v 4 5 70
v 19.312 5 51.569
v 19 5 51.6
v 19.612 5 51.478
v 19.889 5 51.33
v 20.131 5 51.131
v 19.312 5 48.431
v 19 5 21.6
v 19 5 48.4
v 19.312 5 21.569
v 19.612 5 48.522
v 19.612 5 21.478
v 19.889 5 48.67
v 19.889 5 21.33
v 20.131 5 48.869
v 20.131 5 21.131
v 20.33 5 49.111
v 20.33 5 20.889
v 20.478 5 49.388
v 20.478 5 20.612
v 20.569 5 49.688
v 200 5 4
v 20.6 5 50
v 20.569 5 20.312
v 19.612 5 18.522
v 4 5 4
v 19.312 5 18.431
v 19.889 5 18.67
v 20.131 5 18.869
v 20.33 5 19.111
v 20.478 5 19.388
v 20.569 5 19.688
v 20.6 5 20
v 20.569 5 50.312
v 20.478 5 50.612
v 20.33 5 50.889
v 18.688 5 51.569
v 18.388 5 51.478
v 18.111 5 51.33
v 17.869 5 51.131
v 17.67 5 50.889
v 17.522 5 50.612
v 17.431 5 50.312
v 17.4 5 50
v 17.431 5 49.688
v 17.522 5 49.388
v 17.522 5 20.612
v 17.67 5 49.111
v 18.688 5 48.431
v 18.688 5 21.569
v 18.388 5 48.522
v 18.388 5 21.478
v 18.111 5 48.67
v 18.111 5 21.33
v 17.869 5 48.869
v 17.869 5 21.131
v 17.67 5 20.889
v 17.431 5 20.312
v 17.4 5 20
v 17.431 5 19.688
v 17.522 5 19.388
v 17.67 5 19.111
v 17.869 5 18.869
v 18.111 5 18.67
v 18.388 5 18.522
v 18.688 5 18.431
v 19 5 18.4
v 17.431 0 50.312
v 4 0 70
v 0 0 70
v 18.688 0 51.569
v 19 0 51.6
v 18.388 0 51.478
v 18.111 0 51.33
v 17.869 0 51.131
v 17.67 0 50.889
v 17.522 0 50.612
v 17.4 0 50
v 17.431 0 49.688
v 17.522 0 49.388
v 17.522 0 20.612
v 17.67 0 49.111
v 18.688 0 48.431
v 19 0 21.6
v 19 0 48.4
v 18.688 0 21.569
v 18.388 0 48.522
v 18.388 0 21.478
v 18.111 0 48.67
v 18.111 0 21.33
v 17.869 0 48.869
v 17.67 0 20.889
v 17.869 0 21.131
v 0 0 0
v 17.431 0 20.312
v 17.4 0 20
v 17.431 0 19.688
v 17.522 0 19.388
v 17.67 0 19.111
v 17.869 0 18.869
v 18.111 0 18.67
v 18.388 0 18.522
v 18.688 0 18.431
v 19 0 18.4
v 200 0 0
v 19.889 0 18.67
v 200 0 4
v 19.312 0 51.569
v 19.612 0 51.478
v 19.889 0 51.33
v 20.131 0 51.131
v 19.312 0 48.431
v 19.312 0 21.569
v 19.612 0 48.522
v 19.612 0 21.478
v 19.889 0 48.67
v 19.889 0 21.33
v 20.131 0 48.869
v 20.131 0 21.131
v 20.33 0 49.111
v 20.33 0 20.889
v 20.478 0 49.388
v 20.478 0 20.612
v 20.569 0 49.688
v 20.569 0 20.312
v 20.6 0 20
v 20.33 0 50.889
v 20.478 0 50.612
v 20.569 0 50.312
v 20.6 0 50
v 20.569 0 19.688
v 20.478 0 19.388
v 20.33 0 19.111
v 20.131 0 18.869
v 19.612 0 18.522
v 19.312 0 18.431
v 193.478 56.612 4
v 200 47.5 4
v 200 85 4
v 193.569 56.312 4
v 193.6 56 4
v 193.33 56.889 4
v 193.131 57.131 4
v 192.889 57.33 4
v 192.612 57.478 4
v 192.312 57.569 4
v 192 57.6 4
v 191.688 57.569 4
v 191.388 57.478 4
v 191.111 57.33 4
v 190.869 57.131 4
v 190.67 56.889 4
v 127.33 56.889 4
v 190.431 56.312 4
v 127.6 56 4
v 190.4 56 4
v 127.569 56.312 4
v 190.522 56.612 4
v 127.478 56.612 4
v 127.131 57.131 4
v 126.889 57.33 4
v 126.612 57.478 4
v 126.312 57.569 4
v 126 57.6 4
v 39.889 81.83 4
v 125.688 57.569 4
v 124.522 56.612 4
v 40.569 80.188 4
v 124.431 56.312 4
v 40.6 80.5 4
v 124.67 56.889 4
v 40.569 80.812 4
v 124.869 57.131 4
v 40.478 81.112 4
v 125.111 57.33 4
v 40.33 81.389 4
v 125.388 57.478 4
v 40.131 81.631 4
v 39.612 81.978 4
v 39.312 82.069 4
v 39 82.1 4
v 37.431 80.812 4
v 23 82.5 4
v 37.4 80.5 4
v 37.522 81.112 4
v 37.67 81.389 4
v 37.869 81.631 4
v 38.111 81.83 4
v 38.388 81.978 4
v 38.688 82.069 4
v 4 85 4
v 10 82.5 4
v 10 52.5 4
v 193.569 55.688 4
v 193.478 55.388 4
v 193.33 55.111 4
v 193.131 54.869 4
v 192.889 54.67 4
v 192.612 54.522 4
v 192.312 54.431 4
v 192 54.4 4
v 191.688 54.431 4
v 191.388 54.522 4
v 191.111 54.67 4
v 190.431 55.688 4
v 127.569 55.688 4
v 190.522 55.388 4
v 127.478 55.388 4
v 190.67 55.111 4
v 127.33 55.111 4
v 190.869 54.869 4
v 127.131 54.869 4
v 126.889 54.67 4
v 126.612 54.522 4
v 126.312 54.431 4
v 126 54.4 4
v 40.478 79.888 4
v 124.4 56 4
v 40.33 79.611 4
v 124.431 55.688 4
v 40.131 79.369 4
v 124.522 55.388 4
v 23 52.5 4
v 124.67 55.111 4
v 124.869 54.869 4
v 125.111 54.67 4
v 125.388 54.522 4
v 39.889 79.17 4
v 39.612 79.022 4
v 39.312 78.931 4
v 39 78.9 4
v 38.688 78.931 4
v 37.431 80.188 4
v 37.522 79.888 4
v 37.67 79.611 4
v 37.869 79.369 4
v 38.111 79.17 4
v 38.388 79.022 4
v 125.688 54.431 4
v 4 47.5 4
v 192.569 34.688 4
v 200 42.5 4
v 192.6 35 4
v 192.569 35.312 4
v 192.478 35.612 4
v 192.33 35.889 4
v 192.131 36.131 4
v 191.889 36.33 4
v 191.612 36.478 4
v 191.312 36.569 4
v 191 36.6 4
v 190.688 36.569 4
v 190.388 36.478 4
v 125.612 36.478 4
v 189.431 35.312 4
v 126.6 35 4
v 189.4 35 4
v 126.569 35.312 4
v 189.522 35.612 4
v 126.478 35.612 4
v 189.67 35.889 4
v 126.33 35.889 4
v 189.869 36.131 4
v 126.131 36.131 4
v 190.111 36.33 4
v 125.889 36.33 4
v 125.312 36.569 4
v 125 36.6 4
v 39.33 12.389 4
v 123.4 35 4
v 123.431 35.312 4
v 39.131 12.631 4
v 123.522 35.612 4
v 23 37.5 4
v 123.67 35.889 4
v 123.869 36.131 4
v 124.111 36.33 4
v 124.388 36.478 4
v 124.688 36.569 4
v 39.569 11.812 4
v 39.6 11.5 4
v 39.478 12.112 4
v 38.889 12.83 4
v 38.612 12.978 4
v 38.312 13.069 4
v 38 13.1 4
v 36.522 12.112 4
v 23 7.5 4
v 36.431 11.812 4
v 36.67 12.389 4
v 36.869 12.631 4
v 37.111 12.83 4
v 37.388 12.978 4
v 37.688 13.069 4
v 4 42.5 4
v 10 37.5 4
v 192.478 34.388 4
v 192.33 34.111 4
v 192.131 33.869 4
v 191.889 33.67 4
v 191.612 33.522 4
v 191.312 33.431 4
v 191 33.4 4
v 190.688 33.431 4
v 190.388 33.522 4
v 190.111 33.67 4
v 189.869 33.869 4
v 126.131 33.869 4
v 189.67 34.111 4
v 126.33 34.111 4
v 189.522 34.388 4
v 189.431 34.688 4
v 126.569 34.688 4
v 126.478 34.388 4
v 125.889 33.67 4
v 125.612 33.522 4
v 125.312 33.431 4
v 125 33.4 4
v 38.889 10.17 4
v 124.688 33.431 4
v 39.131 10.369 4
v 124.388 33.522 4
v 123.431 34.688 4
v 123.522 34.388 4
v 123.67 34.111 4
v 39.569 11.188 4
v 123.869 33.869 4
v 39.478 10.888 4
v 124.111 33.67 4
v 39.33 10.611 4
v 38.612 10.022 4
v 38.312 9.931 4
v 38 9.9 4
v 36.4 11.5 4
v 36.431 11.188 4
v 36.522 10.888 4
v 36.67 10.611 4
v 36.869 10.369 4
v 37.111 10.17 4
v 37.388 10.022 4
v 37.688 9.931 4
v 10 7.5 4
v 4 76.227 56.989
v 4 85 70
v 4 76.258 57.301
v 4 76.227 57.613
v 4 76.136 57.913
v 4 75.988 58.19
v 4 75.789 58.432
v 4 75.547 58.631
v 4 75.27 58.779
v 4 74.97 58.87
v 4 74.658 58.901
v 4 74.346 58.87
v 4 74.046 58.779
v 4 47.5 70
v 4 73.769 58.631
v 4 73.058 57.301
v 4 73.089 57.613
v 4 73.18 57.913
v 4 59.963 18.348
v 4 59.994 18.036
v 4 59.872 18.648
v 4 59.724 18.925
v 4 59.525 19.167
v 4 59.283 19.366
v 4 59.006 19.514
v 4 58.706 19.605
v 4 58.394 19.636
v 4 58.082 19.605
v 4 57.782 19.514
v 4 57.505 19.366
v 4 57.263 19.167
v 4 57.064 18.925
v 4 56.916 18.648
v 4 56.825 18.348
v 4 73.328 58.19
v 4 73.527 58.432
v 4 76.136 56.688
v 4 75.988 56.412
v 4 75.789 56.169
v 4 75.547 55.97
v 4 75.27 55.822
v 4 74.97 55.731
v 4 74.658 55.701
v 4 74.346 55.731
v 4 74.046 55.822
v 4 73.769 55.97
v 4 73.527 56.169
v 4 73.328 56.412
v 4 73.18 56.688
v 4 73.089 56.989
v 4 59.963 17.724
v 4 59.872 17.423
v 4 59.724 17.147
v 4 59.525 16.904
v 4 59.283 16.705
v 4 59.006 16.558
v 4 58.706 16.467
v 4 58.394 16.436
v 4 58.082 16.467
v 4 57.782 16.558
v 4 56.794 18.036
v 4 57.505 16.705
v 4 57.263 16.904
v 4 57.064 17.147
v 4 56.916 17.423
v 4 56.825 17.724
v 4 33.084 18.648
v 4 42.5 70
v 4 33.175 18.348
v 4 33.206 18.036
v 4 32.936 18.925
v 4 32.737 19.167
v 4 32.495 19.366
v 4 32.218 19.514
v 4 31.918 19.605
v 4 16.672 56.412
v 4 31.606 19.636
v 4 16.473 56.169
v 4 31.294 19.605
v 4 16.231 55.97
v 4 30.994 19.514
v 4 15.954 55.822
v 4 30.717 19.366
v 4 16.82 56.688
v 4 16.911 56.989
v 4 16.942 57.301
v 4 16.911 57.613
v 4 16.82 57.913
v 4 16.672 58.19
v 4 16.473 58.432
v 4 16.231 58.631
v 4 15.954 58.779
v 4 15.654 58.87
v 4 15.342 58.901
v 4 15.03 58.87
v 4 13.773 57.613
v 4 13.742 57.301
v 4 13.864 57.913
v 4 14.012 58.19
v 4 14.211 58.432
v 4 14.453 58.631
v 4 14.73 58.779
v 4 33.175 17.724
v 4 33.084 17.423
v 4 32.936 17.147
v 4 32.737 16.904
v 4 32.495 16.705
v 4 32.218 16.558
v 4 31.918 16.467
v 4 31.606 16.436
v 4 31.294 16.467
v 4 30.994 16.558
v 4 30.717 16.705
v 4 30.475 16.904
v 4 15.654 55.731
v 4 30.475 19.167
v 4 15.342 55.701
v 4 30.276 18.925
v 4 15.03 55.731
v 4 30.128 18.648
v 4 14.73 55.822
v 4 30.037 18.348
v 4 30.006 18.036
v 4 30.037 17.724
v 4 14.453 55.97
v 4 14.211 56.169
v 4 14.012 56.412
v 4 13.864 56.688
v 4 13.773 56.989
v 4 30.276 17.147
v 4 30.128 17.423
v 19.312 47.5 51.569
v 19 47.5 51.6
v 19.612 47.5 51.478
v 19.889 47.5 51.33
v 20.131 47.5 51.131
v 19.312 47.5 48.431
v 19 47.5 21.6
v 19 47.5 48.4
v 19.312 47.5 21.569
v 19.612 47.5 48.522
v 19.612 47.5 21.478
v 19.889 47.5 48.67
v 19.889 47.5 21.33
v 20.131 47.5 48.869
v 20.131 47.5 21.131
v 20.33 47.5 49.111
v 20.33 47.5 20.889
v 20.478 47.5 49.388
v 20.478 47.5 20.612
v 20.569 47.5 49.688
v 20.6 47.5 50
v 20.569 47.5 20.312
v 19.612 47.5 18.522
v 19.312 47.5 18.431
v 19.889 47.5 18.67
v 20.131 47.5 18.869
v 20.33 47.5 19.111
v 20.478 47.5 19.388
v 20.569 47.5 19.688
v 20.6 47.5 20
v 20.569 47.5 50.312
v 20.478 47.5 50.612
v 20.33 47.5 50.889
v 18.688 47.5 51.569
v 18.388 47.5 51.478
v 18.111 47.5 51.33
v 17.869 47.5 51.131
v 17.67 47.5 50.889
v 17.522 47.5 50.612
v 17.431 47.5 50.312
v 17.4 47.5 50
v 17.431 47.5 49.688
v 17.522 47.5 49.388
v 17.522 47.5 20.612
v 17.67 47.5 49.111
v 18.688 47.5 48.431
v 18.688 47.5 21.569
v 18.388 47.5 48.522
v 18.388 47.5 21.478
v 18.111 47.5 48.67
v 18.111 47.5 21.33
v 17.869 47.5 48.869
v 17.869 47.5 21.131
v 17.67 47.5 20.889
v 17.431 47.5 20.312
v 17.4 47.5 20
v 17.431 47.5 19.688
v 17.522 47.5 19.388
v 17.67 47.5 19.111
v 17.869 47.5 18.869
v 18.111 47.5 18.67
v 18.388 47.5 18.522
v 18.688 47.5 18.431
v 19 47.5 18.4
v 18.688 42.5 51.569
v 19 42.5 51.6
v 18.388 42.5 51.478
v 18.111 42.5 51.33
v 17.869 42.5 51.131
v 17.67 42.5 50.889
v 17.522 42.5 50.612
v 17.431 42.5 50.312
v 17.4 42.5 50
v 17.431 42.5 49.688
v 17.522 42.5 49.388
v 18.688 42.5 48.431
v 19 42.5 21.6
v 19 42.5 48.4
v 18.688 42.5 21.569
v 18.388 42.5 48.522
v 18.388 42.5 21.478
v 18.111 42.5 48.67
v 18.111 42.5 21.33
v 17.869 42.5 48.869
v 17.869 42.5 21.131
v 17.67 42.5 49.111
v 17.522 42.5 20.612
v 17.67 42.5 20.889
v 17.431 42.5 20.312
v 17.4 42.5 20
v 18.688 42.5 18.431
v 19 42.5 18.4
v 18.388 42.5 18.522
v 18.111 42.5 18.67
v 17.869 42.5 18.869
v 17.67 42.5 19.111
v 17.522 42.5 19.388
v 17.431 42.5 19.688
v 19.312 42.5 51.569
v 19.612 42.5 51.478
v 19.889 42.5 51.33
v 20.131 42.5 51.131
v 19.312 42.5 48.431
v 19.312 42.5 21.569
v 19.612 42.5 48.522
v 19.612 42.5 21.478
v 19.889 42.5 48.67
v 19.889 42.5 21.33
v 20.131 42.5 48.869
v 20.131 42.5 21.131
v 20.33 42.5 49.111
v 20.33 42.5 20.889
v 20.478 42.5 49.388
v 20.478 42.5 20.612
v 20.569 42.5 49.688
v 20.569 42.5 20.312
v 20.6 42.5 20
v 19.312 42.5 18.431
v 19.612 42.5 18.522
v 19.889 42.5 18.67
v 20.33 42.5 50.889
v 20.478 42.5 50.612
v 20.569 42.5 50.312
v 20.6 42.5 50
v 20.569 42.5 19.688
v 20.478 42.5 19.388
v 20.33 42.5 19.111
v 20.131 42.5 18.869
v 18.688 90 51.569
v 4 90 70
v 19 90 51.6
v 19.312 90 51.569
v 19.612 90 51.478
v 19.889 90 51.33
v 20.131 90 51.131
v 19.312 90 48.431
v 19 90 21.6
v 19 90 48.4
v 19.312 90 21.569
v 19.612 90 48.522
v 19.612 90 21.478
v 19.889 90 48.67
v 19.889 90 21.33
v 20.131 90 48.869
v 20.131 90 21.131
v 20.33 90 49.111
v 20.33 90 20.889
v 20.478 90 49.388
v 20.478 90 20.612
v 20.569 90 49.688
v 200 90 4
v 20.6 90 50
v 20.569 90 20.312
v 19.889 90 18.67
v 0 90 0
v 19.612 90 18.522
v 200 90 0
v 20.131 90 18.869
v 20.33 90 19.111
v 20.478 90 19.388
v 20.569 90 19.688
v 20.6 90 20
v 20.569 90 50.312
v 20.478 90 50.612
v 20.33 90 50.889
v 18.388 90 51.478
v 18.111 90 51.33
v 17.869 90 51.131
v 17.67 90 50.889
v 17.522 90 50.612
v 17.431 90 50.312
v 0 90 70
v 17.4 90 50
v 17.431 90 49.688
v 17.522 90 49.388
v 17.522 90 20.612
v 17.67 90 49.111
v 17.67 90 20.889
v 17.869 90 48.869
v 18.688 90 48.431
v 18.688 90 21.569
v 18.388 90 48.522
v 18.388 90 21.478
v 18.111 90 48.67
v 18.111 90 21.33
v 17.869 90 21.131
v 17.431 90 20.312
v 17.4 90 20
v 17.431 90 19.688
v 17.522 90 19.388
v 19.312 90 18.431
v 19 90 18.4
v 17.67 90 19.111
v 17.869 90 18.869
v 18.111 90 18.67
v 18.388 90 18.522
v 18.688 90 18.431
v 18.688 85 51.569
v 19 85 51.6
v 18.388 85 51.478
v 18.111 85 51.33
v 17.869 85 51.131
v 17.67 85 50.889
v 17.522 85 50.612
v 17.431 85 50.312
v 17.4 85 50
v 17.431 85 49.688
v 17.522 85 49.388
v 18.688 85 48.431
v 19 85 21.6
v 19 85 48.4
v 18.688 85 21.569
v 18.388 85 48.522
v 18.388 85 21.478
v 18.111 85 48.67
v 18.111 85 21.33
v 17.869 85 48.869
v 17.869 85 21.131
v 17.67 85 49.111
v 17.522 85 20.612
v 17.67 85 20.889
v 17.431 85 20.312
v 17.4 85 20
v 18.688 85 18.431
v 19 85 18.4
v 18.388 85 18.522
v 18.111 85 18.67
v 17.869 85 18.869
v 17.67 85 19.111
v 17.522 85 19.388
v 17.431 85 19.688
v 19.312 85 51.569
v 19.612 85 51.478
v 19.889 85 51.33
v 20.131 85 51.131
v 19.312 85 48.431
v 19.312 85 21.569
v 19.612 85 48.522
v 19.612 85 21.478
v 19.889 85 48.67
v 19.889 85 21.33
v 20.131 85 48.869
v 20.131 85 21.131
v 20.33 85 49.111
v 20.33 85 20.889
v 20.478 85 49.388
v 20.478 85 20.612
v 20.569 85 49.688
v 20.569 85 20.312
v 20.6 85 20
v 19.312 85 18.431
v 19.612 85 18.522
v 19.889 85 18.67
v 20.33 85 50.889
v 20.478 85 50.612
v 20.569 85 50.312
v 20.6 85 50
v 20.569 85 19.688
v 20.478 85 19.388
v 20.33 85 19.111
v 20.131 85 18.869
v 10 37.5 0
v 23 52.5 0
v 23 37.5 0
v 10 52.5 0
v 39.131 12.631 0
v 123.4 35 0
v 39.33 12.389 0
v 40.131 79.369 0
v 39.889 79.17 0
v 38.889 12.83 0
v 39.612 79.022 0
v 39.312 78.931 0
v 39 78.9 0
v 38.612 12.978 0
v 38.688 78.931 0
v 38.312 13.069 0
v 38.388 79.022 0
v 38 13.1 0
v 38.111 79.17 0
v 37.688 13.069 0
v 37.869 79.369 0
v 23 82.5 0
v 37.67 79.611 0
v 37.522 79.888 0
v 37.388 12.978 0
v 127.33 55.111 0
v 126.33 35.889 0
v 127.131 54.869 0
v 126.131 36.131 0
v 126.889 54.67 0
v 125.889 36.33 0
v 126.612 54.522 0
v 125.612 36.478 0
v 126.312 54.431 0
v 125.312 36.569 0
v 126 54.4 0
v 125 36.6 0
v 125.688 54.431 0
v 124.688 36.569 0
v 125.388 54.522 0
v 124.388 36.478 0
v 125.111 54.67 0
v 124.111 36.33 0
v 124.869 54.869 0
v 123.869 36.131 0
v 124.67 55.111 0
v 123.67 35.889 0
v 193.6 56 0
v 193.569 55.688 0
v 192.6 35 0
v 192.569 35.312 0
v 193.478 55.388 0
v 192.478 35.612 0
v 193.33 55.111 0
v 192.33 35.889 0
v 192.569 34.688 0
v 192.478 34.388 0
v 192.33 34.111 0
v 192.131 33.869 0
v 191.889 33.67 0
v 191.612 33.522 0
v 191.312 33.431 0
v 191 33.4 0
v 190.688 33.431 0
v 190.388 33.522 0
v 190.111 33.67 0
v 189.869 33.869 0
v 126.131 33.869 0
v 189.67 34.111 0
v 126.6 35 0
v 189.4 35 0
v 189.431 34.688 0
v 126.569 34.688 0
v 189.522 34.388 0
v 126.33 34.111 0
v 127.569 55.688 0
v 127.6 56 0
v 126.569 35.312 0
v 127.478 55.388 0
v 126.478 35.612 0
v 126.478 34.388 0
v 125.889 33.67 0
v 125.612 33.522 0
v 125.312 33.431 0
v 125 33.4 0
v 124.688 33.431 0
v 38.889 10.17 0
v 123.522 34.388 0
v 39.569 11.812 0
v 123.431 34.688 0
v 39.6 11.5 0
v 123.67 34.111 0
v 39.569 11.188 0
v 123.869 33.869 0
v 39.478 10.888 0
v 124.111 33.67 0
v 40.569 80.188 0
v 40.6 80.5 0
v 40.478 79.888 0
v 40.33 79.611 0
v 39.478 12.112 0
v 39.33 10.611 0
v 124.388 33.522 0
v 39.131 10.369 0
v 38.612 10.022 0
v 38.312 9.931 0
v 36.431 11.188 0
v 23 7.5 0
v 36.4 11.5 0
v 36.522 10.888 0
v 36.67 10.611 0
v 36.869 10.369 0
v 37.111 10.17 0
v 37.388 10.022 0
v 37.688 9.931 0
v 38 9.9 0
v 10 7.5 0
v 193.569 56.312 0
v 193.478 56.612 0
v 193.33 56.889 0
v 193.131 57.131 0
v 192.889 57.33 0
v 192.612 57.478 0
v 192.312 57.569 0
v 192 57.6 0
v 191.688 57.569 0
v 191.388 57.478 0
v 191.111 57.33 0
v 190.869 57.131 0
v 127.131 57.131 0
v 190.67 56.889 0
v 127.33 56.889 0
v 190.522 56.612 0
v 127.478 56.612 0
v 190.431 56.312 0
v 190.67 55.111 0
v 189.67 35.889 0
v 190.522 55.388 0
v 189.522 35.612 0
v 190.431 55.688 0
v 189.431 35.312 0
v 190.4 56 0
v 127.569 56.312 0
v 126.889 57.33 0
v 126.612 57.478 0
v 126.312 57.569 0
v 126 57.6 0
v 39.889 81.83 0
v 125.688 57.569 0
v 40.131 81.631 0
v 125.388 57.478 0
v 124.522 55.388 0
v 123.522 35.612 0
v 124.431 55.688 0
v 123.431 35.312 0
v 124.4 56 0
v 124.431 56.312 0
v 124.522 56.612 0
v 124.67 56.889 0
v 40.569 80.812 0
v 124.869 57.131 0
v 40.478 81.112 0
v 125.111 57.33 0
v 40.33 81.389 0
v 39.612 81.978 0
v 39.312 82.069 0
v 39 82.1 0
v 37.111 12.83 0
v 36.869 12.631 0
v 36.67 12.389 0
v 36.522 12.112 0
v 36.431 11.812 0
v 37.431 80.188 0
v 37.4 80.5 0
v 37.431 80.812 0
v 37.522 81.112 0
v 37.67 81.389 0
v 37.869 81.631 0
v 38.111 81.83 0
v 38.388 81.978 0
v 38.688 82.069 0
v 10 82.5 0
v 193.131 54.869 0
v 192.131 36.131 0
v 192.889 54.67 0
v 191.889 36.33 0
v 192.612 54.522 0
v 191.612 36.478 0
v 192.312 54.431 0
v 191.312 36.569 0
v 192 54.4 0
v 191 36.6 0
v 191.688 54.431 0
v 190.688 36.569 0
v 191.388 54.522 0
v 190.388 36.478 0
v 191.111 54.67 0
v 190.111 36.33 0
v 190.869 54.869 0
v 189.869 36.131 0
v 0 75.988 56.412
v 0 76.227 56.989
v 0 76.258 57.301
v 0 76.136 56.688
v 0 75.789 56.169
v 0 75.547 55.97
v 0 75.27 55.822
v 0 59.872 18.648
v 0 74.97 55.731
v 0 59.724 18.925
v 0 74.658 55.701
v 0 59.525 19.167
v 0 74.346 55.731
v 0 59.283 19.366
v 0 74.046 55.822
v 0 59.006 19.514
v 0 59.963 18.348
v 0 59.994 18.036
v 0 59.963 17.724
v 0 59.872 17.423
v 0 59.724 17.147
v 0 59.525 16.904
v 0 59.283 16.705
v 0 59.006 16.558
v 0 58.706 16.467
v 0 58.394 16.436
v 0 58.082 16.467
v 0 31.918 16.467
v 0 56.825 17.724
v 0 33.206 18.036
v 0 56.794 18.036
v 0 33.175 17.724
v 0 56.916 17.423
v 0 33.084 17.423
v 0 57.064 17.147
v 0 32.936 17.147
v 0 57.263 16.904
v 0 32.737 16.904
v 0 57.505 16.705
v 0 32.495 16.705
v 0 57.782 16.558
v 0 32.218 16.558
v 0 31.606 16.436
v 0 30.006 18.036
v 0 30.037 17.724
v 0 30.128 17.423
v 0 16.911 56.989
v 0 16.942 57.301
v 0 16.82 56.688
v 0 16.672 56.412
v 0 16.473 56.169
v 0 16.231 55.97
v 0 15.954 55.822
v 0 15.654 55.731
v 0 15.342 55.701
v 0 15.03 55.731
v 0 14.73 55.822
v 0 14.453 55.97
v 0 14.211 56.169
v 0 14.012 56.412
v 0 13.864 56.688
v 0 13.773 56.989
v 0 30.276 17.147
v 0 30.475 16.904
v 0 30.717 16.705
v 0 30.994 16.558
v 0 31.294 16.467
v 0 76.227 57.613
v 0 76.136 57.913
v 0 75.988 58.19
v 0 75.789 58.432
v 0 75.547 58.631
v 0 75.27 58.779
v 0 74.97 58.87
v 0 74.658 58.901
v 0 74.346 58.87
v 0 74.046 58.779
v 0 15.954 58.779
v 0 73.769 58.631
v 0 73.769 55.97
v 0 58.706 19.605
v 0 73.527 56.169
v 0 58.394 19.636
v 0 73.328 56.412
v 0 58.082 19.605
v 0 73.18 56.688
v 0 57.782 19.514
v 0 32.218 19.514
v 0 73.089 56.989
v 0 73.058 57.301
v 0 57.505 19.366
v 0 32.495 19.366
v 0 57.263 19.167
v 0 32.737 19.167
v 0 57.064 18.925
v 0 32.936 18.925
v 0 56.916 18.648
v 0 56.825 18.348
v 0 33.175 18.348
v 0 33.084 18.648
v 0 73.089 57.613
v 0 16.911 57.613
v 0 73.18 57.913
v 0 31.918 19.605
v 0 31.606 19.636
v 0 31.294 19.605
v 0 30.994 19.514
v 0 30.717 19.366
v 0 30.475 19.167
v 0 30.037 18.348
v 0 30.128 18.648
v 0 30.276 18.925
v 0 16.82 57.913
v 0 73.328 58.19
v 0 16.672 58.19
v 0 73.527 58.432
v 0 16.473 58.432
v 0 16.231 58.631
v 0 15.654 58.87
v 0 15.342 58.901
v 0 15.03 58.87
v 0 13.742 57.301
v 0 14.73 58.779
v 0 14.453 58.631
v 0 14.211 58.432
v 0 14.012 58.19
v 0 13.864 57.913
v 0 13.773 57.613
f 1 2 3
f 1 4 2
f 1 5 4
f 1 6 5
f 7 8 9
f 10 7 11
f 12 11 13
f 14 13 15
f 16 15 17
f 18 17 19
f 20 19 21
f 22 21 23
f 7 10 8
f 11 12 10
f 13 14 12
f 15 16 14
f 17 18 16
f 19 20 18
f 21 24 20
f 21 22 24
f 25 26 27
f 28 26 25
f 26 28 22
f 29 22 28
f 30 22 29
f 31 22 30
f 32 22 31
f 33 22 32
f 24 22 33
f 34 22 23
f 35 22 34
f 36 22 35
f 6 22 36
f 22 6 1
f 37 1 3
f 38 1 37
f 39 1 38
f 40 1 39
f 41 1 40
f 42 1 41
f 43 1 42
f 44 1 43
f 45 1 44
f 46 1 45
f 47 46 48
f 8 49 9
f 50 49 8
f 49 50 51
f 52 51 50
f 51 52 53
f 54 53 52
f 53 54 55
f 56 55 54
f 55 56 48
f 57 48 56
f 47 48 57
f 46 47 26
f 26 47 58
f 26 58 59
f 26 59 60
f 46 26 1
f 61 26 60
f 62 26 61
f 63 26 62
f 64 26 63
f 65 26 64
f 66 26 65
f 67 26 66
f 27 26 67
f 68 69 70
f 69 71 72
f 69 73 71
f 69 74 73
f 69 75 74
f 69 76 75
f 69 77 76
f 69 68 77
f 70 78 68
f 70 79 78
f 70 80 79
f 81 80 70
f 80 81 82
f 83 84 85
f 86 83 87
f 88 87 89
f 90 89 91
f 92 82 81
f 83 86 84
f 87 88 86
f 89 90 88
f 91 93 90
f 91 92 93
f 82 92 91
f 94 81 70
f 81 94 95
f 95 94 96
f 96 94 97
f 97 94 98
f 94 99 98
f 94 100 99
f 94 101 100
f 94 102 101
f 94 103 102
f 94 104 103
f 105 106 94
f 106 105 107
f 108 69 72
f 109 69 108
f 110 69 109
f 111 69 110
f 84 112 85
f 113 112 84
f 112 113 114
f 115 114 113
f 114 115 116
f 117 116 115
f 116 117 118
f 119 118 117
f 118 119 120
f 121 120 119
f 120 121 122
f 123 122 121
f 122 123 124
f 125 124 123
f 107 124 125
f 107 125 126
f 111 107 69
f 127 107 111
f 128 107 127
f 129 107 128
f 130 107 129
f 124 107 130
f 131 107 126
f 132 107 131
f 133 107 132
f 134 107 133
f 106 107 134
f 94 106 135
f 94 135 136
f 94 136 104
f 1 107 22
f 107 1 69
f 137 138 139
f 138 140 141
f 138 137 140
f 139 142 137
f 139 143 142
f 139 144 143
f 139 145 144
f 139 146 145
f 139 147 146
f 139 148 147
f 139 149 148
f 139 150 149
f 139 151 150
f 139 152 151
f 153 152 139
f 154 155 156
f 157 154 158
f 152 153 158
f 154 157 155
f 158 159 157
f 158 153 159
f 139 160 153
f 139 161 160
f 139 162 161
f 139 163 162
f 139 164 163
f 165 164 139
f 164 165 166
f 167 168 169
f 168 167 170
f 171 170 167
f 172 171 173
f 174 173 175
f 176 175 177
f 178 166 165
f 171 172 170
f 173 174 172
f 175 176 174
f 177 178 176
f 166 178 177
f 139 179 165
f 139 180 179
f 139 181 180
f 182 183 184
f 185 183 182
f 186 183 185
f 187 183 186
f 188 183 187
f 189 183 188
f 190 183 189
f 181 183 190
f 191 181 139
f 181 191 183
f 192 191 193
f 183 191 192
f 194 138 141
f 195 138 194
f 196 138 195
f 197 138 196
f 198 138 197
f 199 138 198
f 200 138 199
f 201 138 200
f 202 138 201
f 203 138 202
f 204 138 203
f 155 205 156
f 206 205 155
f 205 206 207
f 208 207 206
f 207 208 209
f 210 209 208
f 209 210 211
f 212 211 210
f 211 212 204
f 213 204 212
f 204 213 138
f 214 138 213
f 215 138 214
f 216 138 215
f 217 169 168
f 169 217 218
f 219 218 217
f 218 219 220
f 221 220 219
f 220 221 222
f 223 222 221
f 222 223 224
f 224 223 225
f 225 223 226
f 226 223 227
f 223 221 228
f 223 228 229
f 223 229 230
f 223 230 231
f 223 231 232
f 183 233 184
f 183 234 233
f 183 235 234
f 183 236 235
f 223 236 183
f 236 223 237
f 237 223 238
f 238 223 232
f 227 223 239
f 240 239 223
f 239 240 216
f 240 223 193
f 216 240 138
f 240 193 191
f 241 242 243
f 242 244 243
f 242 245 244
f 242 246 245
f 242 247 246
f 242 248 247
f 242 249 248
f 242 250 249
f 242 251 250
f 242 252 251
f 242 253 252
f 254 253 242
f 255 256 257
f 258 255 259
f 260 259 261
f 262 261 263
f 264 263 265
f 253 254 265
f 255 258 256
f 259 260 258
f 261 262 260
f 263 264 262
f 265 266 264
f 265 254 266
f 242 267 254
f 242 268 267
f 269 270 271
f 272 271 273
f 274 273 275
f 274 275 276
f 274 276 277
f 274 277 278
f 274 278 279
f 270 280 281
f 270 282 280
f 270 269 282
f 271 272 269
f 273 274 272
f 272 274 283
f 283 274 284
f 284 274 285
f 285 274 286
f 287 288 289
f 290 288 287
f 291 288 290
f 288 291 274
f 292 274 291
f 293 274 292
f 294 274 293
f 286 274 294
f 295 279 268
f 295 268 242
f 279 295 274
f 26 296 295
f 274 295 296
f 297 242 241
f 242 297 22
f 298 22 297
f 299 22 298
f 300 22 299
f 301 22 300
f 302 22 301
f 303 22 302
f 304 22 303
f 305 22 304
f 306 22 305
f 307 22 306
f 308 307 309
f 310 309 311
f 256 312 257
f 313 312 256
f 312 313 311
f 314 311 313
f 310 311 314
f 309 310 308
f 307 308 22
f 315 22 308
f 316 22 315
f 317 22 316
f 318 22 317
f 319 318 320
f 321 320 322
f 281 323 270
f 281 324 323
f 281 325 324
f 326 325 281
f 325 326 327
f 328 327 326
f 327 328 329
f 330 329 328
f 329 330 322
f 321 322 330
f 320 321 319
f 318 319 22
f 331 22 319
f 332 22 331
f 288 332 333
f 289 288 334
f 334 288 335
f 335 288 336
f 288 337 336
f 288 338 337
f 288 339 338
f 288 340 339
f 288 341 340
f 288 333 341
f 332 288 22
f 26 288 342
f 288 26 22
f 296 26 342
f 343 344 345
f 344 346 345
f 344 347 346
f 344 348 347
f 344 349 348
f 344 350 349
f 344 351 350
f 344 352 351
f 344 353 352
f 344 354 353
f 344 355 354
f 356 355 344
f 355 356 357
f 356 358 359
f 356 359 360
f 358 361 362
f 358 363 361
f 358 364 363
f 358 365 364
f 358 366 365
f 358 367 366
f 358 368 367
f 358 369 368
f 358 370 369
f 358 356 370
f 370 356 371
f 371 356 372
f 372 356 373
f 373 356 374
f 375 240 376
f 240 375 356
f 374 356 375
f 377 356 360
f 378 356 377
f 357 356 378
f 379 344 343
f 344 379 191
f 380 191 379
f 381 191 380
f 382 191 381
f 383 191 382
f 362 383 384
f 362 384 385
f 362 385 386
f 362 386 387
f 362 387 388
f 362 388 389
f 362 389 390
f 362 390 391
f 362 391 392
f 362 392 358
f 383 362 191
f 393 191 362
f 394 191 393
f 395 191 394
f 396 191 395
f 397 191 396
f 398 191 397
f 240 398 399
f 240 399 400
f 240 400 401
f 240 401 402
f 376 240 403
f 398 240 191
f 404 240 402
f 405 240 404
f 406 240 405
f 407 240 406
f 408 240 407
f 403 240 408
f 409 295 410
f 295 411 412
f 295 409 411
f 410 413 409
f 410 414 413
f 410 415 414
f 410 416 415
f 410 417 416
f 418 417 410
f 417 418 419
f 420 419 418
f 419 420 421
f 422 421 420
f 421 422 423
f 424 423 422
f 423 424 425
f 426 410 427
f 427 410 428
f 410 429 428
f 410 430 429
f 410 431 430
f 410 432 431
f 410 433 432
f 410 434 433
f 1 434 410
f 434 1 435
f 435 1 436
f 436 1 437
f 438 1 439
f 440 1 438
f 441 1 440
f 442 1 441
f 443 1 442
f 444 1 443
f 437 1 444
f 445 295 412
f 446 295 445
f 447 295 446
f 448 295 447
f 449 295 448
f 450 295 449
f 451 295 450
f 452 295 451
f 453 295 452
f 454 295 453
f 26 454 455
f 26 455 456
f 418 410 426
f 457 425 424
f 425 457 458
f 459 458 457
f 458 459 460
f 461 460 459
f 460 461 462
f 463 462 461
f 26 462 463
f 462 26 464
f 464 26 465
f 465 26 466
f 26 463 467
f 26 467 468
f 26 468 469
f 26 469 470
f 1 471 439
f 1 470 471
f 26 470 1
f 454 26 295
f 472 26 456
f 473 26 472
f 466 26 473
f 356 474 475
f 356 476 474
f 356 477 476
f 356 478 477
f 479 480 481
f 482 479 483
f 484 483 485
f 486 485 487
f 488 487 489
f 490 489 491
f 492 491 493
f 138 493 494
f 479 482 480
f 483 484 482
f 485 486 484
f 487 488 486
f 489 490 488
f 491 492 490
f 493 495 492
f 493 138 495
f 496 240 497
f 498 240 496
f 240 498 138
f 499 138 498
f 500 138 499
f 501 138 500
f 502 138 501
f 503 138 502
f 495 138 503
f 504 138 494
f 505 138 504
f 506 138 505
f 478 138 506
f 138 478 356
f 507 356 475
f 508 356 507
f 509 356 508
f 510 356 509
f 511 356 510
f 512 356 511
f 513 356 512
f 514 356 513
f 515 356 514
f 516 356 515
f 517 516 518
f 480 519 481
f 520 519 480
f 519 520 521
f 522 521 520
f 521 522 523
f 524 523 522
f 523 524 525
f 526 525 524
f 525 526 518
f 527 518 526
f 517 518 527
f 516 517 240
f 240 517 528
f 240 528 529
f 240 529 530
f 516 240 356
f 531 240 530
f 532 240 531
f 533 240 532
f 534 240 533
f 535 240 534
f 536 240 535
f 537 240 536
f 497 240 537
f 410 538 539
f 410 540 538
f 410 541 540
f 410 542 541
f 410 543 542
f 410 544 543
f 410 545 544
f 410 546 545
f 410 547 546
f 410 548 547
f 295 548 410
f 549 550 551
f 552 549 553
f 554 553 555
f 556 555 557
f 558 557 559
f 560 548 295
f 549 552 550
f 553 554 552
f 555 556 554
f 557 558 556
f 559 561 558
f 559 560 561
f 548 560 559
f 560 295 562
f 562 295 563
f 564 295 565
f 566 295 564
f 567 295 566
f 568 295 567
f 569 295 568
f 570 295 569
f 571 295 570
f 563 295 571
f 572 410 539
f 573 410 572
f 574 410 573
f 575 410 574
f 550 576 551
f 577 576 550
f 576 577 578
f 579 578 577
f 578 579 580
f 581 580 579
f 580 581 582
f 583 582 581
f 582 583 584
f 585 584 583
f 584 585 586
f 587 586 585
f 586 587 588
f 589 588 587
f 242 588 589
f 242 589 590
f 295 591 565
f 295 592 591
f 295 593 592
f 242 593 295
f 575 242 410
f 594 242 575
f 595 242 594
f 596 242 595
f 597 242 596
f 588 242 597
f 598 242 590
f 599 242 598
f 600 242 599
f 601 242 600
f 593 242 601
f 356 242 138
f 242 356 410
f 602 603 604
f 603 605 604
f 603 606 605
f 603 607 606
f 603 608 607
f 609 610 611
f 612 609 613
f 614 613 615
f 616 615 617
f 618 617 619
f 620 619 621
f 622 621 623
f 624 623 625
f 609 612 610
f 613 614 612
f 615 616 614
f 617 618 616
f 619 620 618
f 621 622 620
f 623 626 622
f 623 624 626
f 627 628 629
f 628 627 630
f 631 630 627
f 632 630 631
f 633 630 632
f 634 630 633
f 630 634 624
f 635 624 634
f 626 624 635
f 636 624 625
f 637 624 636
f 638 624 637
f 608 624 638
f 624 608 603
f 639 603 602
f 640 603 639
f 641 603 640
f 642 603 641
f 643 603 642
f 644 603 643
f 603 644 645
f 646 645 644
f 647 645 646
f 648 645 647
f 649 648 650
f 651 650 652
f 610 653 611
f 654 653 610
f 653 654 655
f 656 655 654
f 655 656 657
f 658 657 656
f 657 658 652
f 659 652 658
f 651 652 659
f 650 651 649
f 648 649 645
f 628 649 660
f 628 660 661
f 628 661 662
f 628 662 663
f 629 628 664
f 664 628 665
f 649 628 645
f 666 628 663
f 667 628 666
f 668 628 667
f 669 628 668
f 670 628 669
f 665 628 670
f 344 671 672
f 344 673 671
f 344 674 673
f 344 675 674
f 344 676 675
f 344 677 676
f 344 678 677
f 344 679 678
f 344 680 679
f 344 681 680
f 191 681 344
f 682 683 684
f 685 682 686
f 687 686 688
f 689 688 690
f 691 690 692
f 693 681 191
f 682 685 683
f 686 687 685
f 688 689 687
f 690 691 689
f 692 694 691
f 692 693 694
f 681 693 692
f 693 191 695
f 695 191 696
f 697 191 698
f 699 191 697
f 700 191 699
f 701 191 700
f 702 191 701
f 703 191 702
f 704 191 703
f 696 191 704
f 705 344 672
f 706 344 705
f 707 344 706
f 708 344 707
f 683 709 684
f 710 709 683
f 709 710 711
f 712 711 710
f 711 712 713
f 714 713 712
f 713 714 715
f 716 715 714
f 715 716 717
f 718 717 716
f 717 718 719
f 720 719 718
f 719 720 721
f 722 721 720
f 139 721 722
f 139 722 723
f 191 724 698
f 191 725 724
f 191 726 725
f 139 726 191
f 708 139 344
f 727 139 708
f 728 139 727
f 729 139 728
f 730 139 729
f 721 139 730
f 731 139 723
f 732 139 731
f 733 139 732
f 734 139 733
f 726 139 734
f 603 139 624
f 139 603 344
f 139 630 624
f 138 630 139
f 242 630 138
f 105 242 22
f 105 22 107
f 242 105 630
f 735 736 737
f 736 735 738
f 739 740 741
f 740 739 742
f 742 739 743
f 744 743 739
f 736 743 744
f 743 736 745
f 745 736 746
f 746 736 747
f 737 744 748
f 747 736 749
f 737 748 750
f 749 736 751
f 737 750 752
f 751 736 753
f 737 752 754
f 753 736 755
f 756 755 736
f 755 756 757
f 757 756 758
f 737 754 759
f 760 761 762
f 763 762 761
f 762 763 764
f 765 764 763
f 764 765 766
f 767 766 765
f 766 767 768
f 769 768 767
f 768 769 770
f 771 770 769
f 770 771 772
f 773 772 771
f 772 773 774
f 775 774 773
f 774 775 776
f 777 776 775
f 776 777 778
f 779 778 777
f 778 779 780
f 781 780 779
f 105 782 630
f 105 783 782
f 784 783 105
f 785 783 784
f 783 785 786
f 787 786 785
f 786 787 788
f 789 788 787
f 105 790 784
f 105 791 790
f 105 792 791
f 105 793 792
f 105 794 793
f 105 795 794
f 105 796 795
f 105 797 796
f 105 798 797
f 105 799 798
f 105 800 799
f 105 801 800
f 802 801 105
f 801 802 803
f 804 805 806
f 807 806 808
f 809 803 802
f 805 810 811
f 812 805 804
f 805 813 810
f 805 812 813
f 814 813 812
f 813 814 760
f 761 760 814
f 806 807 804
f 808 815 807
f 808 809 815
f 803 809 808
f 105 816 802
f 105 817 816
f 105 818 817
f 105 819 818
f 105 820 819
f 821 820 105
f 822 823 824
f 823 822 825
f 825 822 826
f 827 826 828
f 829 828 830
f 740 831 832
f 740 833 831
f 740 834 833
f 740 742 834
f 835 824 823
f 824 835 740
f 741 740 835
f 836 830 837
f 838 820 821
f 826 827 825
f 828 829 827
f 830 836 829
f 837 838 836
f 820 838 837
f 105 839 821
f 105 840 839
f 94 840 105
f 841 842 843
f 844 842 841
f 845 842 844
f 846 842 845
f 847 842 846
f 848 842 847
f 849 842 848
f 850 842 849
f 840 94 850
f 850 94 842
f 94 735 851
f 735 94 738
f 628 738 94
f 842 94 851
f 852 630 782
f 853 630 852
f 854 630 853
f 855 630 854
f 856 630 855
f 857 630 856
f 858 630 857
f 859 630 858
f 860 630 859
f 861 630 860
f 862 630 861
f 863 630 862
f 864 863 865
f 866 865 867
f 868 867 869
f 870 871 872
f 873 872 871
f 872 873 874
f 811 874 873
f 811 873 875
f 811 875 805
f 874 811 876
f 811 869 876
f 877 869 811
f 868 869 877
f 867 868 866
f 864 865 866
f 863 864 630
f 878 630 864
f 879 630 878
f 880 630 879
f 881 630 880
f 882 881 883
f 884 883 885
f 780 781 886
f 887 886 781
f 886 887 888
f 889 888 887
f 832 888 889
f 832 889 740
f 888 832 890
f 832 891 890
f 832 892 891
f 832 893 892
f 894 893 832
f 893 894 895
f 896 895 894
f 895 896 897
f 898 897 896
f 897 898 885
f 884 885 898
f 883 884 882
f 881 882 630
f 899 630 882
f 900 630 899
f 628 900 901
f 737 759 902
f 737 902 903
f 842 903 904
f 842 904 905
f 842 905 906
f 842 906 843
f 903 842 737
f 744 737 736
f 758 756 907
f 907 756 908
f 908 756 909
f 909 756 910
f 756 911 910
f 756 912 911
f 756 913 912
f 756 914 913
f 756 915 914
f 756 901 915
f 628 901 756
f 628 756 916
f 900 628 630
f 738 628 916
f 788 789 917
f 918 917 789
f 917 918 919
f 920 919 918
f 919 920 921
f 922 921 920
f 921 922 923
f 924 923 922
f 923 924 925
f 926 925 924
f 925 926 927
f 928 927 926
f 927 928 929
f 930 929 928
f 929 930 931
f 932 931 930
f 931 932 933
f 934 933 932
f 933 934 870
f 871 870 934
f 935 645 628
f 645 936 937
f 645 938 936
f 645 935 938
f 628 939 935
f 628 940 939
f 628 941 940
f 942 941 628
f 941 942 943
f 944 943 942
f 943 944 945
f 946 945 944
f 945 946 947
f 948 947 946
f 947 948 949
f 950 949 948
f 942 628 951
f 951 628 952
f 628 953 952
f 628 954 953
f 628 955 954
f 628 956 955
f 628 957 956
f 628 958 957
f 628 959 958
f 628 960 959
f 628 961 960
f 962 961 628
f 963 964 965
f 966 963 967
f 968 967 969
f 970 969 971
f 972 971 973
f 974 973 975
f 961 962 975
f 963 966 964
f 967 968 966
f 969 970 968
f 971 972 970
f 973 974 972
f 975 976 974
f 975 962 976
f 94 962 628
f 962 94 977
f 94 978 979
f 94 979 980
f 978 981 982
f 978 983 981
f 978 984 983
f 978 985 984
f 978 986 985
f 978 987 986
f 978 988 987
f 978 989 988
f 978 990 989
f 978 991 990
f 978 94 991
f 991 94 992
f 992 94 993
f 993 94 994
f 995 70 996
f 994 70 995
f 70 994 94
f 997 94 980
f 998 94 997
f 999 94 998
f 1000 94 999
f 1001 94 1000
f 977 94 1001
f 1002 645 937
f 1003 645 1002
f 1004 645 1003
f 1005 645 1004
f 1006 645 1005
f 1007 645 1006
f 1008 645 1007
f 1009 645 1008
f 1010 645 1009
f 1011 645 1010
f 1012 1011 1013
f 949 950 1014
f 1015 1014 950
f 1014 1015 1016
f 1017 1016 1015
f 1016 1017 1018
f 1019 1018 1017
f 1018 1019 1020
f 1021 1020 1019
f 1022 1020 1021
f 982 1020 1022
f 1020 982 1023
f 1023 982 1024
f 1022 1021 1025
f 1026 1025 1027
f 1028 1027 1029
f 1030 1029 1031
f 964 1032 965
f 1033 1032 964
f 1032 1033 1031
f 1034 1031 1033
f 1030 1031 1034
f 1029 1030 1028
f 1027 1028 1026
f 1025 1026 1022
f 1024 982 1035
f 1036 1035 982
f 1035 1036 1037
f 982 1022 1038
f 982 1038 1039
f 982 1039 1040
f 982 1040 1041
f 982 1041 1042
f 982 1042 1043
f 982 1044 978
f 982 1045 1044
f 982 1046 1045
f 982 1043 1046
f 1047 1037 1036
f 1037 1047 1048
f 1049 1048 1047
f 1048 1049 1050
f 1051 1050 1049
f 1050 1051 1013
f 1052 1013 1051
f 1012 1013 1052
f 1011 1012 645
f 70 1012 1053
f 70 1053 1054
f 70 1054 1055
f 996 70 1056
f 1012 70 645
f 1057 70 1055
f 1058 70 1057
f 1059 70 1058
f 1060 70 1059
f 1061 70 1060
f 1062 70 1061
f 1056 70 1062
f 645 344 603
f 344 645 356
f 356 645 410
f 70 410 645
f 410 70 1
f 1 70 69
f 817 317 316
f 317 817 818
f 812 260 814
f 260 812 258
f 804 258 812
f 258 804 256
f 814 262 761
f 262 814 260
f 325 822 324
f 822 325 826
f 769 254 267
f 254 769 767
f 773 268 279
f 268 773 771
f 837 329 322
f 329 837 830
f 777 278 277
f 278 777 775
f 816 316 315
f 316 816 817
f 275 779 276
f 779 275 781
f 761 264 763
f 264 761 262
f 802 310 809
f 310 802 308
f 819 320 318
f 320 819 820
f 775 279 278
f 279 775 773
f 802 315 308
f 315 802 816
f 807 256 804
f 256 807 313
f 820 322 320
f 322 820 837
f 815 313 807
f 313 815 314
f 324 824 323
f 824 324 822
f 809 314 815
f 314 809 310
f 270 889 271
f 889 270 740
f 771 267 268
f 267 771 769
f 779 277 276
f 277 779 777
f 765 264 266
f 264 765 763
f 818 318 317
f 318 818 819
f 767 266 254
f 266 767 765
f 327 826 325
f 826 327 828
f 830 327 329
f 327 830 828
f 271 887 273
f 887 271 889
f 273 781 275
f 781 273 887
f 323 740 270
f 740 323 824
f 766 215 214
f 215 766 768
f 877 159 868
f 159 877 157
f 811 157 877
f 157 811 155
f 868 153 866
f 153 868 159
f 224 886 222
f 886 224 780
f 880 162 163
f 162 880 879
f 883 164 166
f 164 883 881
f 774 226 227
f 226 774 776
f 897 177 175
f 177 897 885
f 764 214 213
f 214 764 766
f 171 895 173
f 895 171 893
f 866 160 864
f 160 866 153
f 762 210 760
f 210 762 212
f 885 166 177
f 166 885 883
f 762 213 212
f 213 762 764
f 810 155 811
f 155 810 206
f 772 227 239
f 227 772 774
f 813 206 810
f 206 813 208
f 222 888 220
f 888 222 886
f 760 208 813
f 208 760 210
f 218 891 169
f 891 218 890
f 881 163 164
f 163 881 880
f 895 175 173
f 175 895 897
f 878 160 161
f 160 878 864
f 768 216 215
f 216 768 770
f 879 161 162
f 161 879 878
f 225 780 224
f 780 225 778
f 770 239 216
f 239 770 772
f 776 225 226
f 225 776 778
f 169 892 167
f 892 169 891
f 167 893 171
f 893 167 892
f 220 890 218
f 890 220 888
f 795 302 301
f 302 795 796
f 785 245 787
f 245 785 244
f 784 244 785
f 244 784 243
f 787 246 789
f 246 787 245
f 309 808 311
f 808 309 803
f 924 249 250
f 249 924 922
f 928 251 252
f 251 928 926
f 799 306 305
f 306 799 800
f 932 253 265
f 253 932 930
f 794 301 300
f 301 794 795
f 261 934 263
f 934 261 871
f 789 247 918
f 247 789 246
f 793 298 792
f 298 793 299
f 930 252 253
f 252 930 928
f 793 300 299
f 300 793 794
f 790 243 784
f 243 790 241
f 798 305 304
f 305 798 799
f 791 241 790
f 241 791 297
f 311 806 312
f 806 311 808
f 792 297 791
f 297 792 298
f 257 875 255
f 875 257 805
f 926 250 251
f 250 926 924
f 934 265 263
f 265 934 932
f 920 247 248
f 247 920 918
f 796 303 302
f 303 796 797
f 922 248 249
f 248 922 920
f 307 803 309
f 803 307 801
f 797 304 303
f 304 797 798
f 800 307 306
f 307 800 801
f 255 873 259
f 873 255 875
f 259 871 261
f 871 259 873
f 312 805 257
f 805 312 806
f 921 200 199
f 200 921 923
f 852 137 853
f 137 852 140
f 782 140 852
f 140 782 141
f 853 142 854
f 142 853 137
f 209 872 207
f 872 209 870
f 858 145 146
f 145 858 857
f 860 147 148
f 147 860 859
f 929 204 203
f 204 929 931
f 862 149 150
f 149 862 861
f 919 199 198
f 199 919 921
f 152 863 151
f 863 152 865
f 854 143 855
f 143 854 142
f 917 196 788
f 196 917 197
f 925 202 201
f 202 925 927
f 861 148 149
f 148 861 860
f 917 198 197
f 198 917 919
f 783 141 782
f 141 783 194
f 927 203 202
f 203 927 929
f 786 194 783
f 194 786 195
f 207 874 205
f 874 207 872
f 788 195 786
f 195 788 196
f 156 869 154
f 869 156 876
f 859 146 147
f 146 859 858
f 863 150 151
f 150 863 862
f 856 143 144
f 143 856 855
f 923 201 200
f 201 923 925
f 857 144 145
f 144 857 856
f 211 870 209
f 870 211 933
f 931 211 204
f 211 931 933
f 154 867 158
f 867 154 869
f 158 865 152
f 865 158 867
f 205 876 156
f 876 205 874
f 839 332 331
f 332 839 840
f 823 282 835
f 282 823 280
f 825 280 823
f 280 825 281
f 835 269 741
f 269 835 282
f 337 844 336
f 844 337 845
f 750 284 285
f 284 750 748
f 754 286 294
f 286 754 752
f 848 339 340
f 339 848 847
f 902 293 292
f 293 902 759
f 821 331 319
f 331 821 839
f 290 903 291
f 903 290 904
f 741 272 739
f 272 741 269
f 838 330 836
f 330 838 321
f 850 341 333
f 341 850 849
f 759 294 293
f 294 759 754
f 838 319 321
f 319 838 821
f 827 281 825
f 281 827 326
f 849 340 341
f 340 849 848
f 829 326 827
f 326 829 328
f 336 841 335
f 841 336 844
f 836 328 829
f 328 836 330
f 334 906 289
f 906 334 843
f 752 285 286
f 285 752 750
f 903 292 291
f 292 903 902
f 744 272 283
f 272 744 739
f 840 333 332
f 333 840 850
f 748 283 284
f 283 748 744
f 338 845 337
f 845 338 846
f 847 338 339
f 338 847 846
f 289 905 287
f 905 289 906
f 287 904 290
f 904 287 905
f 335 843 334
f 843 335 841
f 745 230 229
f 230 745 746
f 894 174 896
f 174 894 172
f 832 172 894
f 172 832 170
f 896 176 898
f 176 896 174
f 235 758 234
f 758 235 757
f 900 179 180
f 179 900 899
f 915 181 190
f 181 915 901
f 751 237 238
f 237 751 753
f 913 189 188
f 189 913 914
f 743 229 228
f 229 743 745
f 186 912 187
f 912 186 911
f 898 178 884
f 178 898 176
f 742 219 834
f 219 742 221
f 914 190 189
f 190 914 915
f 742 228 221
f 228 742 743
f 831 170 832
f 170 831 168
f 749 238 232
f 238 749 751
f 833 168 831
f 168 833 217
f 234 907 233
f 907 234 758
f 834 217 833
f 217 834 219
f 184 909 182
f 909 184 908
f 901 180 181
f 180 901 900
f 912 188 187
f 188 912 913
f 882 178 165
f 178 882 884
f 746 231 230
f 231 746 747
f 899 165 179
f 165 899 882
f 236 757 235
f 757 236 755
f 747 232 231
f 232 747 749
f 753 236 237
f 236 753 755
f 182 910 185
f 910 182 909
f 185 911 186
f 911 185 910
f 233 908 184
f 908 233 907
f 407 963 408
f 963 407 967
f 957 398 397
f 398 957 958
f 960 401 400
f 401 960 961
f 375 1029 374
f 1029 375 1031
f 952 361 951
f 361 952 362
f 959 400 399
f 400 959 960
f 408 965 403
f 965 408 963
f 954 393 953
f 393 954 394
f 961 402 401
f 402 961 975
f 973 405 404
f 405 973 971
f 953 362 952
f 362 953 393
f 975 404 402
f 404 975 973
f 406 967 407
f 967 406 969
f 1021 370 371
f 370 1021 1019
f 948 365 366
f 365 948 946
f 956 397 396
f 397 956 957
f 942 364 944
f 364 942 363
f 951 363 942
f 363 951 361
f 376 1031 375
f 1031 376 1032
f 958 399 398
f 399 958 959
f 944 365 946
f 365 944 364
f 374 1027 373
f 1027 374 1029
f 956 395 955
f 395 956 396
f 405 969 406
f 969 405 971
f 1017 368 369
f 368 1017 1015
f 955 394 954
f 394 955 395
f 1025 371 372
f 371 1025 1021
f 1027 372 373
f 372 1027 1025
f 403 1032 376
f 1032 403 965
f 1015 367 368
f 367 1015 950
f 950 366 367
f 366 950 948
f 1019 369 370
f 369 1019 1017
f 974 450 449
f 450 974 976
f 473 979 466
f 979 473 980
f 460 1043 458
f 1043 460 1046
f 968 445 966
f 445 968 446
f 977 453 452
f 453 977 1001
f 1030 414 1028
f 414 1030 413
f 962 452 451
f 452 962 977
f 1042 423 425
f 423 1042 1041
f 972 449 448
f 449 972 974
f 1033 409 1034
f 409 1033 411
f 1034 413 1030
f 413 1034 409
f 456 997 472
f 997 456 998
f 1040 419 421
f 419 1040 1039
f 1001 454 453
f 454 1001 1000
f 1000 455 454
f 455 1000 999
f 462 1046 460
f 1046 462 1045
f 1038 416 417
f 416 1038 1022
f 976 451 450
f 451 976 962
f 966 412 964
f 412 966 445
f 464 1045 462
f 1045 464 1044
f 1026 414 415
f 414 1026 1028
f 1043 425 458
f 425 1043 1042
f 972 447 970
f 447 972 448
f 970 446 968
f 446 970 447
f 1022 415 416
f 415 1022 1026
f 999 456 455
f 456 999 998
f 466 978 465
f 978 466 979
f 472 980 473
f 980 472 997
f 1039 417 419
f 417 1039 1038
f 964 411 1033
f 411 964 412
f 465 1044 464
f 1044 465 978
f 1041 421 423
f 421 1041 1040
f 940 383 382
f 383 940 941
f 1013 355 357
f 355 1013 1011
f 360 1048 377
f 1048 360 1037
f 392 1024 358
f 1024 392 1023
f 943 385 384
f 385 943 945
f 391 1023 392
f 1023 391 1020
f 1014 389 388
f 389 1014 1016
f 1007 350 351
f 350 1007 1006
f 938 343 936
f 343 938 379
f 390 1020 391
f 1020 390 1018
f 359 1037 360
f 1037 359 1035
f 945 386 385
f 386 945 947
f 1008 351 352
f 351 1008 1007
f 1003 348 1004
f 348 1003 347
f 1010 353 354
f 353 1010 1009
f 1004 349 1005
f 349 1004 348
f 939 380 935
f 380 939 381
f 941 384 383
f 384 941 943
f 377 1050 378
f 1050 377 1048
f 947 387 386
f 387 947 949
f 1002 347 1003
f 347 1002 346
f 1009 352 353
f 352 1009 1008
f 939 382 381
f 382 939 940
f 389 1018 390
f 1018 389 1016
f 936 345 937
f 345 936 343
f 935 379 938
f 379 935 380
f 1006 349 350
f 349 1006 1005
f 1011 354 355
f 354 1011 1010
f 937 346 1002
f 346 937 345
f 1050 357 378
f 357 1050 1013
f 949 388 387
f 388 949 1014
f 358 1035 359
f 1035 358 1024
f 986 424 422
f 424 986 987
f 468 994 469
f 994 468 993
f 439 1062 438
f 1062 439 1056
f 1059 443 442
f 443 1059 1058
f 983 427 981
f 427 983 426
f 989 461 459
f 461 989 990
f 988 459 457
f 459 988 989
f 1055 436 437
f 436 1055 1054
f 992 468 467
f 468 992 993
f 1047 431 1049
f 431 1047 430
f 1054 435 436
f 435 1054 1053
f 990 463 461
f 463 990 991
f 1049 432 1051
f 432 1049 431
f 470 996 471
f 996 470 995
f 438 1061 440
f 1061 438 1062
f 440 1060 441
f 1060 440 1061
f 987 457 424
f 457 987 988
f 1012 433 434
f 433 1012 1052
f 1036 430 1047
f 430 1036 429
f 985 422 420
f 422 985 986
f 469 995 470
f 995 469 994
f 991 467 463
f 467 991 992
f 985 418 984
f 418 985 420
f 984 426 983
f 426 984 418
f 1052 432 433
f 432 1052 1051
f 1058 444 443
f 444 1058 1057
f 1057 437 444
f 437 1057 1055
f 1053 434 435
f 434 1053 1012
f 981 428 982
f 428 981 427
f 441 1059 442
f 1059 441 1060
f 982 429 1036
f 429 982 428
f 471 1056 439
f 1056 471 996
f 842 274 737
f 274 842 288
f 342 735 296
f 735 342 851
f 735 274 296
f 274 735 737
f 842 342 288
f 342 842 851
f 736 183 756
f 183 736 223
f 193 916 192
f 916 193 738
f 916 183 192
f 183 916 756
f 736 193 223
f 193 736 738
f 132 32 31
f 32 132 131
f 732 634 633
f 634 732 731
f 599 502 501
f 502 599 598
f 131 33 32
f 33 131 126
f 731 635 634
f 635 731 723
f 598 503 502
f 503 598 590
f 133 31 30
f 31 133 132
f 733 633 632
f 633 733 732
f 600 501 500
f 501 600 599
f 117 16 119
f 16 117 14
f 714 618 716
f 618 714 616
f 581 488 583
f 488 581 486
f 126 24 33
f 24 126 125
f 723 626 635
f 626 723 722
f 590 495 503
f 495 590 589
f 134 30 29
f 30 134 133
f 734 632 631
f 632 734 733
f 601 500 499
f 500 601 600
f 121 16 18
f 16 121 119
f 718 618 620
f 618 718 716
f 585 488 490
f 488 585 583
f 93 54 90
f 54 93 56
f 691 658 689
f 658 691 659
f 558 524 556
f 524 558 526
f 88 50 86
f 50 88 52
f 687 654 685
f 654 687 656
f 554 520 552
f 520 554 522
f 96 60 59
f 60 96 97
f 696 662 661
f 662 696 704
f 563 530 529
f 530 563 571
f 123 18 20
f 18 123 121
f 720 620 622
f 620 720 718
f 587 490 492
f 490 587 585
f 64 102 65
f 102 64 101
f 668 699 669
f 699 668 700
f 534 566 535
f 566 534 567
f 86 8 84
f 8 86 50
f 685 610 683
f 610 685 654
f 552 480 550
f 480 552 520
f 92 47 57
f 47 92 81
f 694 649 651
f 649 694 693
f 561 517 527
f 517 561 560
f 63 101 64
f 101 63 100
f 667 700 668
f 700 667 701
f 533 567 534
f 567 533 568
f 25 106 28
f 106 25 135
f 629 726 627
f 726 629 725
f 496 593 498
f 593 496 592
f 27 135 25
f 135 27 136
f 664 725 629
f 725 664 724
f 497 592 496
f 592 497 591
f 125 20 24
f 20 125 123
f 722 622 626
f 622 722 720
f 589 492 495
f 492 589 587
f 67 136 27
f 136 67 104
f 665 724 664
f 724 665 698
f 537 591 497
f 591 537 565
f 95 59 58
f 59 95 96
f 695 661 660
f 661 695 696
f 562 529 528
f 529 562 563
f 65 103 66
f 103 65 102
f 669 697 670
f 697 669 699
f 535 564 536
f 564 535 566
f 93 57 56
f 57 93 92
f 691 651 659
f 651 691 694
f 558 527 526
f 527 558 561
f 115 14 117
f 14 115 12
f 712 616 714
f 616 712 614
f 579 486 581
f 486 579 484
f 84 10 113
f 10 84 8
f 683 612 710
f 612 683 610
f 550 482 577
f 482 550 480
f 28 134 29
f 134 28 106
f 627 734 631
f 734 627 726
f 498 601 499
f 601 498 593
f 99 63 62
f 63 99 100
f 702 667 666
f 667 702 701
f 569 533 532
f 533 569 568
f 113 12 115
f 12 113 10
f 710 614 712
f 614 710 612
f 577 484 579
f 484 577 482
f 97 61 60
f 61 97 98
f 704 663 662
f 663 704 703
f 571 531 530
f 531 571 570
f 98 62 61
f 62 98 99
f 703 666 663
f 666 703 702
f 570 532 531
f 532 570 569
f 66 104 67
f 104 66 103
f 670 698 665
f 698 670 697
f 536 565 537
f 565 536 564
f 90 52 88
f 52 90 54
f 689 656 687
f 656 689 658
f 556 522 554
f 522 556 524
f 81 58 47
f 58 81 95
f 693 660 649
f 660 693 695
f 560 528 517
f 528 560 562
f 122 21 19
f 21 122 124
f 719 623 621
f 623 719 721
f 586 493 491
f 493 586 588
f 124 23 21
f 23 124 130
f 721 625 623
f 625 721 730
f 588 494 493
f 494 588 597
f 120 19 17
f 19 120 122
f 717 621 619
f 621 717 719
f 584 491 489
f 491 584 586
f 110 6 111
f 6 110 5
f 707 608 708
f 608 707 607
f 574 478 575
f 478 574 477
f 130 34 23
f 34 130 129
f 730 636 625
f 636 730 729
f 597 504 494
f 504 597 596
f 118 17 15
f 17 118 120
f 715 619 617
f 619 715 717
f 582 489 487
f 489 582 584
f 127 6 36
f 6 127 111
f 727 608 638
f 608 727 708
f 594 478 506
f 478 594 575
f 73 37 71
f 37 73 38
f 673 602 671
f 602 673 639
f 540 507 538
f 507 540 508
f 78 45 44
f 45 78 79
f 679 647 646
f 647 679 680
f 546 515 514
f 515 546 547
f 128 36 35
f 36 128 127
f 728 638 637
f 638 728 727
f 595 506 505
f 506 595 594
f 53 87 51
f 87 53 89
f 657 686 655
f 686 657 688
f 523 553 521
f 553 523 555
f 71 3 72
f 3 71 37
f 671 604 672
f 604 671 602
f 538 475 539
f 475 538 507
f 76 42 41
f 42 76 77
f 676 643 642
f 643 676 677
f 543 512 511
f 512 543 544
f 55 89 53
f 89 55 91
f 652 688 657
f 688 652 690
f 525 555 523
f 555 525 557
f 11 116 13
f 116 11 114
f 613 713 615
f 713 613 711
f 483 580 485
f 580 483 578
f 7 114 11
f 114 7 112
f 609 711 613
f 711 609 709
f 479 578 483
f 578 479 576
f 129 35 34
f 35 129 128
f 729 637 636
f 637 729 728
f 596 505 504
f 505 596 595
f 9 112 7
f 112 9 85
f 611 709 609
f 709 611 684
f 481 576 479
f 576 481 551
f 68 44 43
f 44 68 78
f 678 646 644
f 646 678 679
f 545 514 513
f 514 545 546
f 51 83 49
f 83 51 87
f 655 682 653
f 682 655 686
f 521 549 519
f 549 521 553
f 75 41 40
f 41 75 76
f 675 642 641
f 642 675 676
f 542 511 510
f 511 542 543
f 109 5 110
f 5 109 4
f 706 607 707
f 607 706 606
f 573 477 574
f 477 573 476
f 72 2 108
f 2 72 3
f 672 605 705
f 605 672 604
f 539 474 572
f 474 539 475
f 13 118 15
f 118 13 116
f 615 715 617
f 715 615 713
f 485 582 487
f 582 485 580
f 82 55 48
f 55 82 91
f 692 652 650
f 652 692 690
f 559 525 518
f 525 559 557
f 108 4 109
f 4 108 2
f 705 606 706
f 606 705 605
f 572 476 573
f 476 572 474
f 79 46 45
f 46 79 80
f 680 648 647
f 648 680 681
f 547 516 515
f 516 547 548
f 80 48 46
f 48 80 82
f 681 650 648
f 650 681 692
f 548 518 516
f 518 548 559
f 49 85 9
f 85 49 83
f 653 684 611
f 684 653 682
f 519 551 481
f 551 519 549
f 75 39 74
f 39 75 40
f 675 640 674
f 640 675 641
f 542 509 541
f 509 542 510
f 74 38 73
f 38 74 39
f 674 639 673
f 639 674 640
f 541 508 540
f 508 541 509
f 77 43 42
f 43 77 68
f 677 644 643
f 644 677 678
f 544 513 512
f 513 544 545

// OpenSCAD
// POV 3D L-bracket — parametric
//
// L-shape with long leg along +X, short leg along +Z, both 50 mm wide
// along Y. Outer dimensions measured to the outside of each leg.

leg_a = 200;   // long-leg outer length — was 170, +30 on open end
leg_b = 70;    // short-leg outer length — was 60, +10 to reach rim outer PCD
width = 90;    // was 80
thick = 4;

gusset_width = 5;
gusset_y_positions = [gusset_width/2, width/2, width - gusset_width/2];  // 2 edge + 1 middle

// (4 corner boss/M3/CB features removed per user request 2026-06-11)
hleg_feat_x_shift = 30;                  // all hleg-top features shifted +30 in X

// 2 × M3 gusset through-holes (along Y, hit both gussets)
gusset_hole_diam       = 3.2;
gusset_hole_x          = 19;          // 15 mm right of gusset's vertical (left) edge
gusset_hole_z_positions = [20, 50];   // lower / upper, 30 mm spacing

// 4 × M3 vleg holes — match 4 rim_ring holes (trapezoid, not a rectangle)
vleg_m3_diam        = 3.2;
rim_r_in            = 35;      // PCD Φ70
rim_r_out           = 77.5;    // PCD Φ155
rim_ang_a           = 157.5;   // first mating angle
rim_ang_b           = 202.5;   // second mating angle (symmetric about rim −X)
hleg_dist_from_center = 14.3;  // rim center → hleg inner 200×90 face
function vleg_pos(R, a) = [R * sin(a) + width/2, -R * cos(a) - hleg_dist_from_center];
vleg_m3_positions = [
    vleg_pos(rim_r_in,  rim_ang_a),
    vleg_pos(rim_r_in,  rim_ang_b),
    vleg_pos(rim_r_out, rim_ang_a),
    vleg_pos(rim_r_out, rim_ang_b),
];

m3_diam      = 3.2;
m3_x_a       = hleg_feat_x_shift + 95;   // 125
m3_spacing_a = 20;
m3_x_b       = m3_x_a + 66;              // 191
m3_spacing_b = 20;
m3_x_c       = hleg_feat_x_shift + 8;    // 38
m3_spacing_c = 67;   // was 70; +1 bottom-shift → actual hole c-to-c 68

// 2 rectangular cutouts through hleg (30 Y × 13 X, left edge X=10, c-to-c 45)
slot_len    = 30;
slot_w      = 13;
slot_x_left = 10;
slot_cc     = 45;
slot_y_centers = [width/2 - slot_cc/2, width/2 + slot_cc/2];   // 22.5, 67.5

// Bottom-row holes (+Y side) are shifted (+1, +1) from the mirror position;
// pair C's bottom hole gets an extra +1 Y (2026-06-12)
shift_bot_x  = 1;
shift_bot_y  = 1;
extra_bot_y_c = 1;

module hole_at(x, y) {
    translate([x, y, -1])
        cylinder(h = thick + 2, d = m3_diam, $fn = 32);
}

module gusset(y_center) {
    translate([0, y_center + gusset_width/2, 0])
        rotate([90, 0, 0])
            linear_extrude(height = gusset_width)
                polygon([[thick, thick], [leg_a, thick], [thick, leg_b]]);
}

module vleg_hole(y, z) {
    translate([-1, y, z])
        rotate([0, 90, 0])
            cylinder(h = thick + 2, d = vleg_m3_diam, $fn = 32);
}

module l_bracket() {
    difference() {
        union() {
            cube([leg_a, width, thick]);
            cube([thick, width, leg_b]);
            for (yc = gusset_y_positions) gusset(yc);
        }
        // 6 × M3 hleg
        for (p = [[m3_x_a, m3_spacing_a, 0],
                  [m3_x_b, m3_spacing_b, 0],
                  [m3_x_c, m3_spacing_c, extra_bot_y_c]]) {
            hole_at(p[0],                 width/2 - p[1]/2);
            hole_at(p[0] + shift_bot_x,   width/2 + p[1]/2 + shift_bot_y + p[2]);
        }
        // 4 × M3 vleg (trapezoid matching rim_ring mating holes)
        for (p = vleg_m3_positions) vleg_hole(p[0], p[1]);
        // 2 rectangular cutouts through hleg plate
        for (sy = slot_y_centers)
            translate([slot_x_left, sy - slot_len/2, -1])
                cube([slot_w, slot_len, thick + 2]);
        // 2 × M3 through both gussets along Y
        for (gz = gusset_hole_z_positions)
            translate([gusset_hole_x, -1, gz])
                rotate([-90, 0, 0])
                    cylinder(h = width + 2, d = gusset_hole_diam, $fn = 32);
    }
}

l_bracket();
